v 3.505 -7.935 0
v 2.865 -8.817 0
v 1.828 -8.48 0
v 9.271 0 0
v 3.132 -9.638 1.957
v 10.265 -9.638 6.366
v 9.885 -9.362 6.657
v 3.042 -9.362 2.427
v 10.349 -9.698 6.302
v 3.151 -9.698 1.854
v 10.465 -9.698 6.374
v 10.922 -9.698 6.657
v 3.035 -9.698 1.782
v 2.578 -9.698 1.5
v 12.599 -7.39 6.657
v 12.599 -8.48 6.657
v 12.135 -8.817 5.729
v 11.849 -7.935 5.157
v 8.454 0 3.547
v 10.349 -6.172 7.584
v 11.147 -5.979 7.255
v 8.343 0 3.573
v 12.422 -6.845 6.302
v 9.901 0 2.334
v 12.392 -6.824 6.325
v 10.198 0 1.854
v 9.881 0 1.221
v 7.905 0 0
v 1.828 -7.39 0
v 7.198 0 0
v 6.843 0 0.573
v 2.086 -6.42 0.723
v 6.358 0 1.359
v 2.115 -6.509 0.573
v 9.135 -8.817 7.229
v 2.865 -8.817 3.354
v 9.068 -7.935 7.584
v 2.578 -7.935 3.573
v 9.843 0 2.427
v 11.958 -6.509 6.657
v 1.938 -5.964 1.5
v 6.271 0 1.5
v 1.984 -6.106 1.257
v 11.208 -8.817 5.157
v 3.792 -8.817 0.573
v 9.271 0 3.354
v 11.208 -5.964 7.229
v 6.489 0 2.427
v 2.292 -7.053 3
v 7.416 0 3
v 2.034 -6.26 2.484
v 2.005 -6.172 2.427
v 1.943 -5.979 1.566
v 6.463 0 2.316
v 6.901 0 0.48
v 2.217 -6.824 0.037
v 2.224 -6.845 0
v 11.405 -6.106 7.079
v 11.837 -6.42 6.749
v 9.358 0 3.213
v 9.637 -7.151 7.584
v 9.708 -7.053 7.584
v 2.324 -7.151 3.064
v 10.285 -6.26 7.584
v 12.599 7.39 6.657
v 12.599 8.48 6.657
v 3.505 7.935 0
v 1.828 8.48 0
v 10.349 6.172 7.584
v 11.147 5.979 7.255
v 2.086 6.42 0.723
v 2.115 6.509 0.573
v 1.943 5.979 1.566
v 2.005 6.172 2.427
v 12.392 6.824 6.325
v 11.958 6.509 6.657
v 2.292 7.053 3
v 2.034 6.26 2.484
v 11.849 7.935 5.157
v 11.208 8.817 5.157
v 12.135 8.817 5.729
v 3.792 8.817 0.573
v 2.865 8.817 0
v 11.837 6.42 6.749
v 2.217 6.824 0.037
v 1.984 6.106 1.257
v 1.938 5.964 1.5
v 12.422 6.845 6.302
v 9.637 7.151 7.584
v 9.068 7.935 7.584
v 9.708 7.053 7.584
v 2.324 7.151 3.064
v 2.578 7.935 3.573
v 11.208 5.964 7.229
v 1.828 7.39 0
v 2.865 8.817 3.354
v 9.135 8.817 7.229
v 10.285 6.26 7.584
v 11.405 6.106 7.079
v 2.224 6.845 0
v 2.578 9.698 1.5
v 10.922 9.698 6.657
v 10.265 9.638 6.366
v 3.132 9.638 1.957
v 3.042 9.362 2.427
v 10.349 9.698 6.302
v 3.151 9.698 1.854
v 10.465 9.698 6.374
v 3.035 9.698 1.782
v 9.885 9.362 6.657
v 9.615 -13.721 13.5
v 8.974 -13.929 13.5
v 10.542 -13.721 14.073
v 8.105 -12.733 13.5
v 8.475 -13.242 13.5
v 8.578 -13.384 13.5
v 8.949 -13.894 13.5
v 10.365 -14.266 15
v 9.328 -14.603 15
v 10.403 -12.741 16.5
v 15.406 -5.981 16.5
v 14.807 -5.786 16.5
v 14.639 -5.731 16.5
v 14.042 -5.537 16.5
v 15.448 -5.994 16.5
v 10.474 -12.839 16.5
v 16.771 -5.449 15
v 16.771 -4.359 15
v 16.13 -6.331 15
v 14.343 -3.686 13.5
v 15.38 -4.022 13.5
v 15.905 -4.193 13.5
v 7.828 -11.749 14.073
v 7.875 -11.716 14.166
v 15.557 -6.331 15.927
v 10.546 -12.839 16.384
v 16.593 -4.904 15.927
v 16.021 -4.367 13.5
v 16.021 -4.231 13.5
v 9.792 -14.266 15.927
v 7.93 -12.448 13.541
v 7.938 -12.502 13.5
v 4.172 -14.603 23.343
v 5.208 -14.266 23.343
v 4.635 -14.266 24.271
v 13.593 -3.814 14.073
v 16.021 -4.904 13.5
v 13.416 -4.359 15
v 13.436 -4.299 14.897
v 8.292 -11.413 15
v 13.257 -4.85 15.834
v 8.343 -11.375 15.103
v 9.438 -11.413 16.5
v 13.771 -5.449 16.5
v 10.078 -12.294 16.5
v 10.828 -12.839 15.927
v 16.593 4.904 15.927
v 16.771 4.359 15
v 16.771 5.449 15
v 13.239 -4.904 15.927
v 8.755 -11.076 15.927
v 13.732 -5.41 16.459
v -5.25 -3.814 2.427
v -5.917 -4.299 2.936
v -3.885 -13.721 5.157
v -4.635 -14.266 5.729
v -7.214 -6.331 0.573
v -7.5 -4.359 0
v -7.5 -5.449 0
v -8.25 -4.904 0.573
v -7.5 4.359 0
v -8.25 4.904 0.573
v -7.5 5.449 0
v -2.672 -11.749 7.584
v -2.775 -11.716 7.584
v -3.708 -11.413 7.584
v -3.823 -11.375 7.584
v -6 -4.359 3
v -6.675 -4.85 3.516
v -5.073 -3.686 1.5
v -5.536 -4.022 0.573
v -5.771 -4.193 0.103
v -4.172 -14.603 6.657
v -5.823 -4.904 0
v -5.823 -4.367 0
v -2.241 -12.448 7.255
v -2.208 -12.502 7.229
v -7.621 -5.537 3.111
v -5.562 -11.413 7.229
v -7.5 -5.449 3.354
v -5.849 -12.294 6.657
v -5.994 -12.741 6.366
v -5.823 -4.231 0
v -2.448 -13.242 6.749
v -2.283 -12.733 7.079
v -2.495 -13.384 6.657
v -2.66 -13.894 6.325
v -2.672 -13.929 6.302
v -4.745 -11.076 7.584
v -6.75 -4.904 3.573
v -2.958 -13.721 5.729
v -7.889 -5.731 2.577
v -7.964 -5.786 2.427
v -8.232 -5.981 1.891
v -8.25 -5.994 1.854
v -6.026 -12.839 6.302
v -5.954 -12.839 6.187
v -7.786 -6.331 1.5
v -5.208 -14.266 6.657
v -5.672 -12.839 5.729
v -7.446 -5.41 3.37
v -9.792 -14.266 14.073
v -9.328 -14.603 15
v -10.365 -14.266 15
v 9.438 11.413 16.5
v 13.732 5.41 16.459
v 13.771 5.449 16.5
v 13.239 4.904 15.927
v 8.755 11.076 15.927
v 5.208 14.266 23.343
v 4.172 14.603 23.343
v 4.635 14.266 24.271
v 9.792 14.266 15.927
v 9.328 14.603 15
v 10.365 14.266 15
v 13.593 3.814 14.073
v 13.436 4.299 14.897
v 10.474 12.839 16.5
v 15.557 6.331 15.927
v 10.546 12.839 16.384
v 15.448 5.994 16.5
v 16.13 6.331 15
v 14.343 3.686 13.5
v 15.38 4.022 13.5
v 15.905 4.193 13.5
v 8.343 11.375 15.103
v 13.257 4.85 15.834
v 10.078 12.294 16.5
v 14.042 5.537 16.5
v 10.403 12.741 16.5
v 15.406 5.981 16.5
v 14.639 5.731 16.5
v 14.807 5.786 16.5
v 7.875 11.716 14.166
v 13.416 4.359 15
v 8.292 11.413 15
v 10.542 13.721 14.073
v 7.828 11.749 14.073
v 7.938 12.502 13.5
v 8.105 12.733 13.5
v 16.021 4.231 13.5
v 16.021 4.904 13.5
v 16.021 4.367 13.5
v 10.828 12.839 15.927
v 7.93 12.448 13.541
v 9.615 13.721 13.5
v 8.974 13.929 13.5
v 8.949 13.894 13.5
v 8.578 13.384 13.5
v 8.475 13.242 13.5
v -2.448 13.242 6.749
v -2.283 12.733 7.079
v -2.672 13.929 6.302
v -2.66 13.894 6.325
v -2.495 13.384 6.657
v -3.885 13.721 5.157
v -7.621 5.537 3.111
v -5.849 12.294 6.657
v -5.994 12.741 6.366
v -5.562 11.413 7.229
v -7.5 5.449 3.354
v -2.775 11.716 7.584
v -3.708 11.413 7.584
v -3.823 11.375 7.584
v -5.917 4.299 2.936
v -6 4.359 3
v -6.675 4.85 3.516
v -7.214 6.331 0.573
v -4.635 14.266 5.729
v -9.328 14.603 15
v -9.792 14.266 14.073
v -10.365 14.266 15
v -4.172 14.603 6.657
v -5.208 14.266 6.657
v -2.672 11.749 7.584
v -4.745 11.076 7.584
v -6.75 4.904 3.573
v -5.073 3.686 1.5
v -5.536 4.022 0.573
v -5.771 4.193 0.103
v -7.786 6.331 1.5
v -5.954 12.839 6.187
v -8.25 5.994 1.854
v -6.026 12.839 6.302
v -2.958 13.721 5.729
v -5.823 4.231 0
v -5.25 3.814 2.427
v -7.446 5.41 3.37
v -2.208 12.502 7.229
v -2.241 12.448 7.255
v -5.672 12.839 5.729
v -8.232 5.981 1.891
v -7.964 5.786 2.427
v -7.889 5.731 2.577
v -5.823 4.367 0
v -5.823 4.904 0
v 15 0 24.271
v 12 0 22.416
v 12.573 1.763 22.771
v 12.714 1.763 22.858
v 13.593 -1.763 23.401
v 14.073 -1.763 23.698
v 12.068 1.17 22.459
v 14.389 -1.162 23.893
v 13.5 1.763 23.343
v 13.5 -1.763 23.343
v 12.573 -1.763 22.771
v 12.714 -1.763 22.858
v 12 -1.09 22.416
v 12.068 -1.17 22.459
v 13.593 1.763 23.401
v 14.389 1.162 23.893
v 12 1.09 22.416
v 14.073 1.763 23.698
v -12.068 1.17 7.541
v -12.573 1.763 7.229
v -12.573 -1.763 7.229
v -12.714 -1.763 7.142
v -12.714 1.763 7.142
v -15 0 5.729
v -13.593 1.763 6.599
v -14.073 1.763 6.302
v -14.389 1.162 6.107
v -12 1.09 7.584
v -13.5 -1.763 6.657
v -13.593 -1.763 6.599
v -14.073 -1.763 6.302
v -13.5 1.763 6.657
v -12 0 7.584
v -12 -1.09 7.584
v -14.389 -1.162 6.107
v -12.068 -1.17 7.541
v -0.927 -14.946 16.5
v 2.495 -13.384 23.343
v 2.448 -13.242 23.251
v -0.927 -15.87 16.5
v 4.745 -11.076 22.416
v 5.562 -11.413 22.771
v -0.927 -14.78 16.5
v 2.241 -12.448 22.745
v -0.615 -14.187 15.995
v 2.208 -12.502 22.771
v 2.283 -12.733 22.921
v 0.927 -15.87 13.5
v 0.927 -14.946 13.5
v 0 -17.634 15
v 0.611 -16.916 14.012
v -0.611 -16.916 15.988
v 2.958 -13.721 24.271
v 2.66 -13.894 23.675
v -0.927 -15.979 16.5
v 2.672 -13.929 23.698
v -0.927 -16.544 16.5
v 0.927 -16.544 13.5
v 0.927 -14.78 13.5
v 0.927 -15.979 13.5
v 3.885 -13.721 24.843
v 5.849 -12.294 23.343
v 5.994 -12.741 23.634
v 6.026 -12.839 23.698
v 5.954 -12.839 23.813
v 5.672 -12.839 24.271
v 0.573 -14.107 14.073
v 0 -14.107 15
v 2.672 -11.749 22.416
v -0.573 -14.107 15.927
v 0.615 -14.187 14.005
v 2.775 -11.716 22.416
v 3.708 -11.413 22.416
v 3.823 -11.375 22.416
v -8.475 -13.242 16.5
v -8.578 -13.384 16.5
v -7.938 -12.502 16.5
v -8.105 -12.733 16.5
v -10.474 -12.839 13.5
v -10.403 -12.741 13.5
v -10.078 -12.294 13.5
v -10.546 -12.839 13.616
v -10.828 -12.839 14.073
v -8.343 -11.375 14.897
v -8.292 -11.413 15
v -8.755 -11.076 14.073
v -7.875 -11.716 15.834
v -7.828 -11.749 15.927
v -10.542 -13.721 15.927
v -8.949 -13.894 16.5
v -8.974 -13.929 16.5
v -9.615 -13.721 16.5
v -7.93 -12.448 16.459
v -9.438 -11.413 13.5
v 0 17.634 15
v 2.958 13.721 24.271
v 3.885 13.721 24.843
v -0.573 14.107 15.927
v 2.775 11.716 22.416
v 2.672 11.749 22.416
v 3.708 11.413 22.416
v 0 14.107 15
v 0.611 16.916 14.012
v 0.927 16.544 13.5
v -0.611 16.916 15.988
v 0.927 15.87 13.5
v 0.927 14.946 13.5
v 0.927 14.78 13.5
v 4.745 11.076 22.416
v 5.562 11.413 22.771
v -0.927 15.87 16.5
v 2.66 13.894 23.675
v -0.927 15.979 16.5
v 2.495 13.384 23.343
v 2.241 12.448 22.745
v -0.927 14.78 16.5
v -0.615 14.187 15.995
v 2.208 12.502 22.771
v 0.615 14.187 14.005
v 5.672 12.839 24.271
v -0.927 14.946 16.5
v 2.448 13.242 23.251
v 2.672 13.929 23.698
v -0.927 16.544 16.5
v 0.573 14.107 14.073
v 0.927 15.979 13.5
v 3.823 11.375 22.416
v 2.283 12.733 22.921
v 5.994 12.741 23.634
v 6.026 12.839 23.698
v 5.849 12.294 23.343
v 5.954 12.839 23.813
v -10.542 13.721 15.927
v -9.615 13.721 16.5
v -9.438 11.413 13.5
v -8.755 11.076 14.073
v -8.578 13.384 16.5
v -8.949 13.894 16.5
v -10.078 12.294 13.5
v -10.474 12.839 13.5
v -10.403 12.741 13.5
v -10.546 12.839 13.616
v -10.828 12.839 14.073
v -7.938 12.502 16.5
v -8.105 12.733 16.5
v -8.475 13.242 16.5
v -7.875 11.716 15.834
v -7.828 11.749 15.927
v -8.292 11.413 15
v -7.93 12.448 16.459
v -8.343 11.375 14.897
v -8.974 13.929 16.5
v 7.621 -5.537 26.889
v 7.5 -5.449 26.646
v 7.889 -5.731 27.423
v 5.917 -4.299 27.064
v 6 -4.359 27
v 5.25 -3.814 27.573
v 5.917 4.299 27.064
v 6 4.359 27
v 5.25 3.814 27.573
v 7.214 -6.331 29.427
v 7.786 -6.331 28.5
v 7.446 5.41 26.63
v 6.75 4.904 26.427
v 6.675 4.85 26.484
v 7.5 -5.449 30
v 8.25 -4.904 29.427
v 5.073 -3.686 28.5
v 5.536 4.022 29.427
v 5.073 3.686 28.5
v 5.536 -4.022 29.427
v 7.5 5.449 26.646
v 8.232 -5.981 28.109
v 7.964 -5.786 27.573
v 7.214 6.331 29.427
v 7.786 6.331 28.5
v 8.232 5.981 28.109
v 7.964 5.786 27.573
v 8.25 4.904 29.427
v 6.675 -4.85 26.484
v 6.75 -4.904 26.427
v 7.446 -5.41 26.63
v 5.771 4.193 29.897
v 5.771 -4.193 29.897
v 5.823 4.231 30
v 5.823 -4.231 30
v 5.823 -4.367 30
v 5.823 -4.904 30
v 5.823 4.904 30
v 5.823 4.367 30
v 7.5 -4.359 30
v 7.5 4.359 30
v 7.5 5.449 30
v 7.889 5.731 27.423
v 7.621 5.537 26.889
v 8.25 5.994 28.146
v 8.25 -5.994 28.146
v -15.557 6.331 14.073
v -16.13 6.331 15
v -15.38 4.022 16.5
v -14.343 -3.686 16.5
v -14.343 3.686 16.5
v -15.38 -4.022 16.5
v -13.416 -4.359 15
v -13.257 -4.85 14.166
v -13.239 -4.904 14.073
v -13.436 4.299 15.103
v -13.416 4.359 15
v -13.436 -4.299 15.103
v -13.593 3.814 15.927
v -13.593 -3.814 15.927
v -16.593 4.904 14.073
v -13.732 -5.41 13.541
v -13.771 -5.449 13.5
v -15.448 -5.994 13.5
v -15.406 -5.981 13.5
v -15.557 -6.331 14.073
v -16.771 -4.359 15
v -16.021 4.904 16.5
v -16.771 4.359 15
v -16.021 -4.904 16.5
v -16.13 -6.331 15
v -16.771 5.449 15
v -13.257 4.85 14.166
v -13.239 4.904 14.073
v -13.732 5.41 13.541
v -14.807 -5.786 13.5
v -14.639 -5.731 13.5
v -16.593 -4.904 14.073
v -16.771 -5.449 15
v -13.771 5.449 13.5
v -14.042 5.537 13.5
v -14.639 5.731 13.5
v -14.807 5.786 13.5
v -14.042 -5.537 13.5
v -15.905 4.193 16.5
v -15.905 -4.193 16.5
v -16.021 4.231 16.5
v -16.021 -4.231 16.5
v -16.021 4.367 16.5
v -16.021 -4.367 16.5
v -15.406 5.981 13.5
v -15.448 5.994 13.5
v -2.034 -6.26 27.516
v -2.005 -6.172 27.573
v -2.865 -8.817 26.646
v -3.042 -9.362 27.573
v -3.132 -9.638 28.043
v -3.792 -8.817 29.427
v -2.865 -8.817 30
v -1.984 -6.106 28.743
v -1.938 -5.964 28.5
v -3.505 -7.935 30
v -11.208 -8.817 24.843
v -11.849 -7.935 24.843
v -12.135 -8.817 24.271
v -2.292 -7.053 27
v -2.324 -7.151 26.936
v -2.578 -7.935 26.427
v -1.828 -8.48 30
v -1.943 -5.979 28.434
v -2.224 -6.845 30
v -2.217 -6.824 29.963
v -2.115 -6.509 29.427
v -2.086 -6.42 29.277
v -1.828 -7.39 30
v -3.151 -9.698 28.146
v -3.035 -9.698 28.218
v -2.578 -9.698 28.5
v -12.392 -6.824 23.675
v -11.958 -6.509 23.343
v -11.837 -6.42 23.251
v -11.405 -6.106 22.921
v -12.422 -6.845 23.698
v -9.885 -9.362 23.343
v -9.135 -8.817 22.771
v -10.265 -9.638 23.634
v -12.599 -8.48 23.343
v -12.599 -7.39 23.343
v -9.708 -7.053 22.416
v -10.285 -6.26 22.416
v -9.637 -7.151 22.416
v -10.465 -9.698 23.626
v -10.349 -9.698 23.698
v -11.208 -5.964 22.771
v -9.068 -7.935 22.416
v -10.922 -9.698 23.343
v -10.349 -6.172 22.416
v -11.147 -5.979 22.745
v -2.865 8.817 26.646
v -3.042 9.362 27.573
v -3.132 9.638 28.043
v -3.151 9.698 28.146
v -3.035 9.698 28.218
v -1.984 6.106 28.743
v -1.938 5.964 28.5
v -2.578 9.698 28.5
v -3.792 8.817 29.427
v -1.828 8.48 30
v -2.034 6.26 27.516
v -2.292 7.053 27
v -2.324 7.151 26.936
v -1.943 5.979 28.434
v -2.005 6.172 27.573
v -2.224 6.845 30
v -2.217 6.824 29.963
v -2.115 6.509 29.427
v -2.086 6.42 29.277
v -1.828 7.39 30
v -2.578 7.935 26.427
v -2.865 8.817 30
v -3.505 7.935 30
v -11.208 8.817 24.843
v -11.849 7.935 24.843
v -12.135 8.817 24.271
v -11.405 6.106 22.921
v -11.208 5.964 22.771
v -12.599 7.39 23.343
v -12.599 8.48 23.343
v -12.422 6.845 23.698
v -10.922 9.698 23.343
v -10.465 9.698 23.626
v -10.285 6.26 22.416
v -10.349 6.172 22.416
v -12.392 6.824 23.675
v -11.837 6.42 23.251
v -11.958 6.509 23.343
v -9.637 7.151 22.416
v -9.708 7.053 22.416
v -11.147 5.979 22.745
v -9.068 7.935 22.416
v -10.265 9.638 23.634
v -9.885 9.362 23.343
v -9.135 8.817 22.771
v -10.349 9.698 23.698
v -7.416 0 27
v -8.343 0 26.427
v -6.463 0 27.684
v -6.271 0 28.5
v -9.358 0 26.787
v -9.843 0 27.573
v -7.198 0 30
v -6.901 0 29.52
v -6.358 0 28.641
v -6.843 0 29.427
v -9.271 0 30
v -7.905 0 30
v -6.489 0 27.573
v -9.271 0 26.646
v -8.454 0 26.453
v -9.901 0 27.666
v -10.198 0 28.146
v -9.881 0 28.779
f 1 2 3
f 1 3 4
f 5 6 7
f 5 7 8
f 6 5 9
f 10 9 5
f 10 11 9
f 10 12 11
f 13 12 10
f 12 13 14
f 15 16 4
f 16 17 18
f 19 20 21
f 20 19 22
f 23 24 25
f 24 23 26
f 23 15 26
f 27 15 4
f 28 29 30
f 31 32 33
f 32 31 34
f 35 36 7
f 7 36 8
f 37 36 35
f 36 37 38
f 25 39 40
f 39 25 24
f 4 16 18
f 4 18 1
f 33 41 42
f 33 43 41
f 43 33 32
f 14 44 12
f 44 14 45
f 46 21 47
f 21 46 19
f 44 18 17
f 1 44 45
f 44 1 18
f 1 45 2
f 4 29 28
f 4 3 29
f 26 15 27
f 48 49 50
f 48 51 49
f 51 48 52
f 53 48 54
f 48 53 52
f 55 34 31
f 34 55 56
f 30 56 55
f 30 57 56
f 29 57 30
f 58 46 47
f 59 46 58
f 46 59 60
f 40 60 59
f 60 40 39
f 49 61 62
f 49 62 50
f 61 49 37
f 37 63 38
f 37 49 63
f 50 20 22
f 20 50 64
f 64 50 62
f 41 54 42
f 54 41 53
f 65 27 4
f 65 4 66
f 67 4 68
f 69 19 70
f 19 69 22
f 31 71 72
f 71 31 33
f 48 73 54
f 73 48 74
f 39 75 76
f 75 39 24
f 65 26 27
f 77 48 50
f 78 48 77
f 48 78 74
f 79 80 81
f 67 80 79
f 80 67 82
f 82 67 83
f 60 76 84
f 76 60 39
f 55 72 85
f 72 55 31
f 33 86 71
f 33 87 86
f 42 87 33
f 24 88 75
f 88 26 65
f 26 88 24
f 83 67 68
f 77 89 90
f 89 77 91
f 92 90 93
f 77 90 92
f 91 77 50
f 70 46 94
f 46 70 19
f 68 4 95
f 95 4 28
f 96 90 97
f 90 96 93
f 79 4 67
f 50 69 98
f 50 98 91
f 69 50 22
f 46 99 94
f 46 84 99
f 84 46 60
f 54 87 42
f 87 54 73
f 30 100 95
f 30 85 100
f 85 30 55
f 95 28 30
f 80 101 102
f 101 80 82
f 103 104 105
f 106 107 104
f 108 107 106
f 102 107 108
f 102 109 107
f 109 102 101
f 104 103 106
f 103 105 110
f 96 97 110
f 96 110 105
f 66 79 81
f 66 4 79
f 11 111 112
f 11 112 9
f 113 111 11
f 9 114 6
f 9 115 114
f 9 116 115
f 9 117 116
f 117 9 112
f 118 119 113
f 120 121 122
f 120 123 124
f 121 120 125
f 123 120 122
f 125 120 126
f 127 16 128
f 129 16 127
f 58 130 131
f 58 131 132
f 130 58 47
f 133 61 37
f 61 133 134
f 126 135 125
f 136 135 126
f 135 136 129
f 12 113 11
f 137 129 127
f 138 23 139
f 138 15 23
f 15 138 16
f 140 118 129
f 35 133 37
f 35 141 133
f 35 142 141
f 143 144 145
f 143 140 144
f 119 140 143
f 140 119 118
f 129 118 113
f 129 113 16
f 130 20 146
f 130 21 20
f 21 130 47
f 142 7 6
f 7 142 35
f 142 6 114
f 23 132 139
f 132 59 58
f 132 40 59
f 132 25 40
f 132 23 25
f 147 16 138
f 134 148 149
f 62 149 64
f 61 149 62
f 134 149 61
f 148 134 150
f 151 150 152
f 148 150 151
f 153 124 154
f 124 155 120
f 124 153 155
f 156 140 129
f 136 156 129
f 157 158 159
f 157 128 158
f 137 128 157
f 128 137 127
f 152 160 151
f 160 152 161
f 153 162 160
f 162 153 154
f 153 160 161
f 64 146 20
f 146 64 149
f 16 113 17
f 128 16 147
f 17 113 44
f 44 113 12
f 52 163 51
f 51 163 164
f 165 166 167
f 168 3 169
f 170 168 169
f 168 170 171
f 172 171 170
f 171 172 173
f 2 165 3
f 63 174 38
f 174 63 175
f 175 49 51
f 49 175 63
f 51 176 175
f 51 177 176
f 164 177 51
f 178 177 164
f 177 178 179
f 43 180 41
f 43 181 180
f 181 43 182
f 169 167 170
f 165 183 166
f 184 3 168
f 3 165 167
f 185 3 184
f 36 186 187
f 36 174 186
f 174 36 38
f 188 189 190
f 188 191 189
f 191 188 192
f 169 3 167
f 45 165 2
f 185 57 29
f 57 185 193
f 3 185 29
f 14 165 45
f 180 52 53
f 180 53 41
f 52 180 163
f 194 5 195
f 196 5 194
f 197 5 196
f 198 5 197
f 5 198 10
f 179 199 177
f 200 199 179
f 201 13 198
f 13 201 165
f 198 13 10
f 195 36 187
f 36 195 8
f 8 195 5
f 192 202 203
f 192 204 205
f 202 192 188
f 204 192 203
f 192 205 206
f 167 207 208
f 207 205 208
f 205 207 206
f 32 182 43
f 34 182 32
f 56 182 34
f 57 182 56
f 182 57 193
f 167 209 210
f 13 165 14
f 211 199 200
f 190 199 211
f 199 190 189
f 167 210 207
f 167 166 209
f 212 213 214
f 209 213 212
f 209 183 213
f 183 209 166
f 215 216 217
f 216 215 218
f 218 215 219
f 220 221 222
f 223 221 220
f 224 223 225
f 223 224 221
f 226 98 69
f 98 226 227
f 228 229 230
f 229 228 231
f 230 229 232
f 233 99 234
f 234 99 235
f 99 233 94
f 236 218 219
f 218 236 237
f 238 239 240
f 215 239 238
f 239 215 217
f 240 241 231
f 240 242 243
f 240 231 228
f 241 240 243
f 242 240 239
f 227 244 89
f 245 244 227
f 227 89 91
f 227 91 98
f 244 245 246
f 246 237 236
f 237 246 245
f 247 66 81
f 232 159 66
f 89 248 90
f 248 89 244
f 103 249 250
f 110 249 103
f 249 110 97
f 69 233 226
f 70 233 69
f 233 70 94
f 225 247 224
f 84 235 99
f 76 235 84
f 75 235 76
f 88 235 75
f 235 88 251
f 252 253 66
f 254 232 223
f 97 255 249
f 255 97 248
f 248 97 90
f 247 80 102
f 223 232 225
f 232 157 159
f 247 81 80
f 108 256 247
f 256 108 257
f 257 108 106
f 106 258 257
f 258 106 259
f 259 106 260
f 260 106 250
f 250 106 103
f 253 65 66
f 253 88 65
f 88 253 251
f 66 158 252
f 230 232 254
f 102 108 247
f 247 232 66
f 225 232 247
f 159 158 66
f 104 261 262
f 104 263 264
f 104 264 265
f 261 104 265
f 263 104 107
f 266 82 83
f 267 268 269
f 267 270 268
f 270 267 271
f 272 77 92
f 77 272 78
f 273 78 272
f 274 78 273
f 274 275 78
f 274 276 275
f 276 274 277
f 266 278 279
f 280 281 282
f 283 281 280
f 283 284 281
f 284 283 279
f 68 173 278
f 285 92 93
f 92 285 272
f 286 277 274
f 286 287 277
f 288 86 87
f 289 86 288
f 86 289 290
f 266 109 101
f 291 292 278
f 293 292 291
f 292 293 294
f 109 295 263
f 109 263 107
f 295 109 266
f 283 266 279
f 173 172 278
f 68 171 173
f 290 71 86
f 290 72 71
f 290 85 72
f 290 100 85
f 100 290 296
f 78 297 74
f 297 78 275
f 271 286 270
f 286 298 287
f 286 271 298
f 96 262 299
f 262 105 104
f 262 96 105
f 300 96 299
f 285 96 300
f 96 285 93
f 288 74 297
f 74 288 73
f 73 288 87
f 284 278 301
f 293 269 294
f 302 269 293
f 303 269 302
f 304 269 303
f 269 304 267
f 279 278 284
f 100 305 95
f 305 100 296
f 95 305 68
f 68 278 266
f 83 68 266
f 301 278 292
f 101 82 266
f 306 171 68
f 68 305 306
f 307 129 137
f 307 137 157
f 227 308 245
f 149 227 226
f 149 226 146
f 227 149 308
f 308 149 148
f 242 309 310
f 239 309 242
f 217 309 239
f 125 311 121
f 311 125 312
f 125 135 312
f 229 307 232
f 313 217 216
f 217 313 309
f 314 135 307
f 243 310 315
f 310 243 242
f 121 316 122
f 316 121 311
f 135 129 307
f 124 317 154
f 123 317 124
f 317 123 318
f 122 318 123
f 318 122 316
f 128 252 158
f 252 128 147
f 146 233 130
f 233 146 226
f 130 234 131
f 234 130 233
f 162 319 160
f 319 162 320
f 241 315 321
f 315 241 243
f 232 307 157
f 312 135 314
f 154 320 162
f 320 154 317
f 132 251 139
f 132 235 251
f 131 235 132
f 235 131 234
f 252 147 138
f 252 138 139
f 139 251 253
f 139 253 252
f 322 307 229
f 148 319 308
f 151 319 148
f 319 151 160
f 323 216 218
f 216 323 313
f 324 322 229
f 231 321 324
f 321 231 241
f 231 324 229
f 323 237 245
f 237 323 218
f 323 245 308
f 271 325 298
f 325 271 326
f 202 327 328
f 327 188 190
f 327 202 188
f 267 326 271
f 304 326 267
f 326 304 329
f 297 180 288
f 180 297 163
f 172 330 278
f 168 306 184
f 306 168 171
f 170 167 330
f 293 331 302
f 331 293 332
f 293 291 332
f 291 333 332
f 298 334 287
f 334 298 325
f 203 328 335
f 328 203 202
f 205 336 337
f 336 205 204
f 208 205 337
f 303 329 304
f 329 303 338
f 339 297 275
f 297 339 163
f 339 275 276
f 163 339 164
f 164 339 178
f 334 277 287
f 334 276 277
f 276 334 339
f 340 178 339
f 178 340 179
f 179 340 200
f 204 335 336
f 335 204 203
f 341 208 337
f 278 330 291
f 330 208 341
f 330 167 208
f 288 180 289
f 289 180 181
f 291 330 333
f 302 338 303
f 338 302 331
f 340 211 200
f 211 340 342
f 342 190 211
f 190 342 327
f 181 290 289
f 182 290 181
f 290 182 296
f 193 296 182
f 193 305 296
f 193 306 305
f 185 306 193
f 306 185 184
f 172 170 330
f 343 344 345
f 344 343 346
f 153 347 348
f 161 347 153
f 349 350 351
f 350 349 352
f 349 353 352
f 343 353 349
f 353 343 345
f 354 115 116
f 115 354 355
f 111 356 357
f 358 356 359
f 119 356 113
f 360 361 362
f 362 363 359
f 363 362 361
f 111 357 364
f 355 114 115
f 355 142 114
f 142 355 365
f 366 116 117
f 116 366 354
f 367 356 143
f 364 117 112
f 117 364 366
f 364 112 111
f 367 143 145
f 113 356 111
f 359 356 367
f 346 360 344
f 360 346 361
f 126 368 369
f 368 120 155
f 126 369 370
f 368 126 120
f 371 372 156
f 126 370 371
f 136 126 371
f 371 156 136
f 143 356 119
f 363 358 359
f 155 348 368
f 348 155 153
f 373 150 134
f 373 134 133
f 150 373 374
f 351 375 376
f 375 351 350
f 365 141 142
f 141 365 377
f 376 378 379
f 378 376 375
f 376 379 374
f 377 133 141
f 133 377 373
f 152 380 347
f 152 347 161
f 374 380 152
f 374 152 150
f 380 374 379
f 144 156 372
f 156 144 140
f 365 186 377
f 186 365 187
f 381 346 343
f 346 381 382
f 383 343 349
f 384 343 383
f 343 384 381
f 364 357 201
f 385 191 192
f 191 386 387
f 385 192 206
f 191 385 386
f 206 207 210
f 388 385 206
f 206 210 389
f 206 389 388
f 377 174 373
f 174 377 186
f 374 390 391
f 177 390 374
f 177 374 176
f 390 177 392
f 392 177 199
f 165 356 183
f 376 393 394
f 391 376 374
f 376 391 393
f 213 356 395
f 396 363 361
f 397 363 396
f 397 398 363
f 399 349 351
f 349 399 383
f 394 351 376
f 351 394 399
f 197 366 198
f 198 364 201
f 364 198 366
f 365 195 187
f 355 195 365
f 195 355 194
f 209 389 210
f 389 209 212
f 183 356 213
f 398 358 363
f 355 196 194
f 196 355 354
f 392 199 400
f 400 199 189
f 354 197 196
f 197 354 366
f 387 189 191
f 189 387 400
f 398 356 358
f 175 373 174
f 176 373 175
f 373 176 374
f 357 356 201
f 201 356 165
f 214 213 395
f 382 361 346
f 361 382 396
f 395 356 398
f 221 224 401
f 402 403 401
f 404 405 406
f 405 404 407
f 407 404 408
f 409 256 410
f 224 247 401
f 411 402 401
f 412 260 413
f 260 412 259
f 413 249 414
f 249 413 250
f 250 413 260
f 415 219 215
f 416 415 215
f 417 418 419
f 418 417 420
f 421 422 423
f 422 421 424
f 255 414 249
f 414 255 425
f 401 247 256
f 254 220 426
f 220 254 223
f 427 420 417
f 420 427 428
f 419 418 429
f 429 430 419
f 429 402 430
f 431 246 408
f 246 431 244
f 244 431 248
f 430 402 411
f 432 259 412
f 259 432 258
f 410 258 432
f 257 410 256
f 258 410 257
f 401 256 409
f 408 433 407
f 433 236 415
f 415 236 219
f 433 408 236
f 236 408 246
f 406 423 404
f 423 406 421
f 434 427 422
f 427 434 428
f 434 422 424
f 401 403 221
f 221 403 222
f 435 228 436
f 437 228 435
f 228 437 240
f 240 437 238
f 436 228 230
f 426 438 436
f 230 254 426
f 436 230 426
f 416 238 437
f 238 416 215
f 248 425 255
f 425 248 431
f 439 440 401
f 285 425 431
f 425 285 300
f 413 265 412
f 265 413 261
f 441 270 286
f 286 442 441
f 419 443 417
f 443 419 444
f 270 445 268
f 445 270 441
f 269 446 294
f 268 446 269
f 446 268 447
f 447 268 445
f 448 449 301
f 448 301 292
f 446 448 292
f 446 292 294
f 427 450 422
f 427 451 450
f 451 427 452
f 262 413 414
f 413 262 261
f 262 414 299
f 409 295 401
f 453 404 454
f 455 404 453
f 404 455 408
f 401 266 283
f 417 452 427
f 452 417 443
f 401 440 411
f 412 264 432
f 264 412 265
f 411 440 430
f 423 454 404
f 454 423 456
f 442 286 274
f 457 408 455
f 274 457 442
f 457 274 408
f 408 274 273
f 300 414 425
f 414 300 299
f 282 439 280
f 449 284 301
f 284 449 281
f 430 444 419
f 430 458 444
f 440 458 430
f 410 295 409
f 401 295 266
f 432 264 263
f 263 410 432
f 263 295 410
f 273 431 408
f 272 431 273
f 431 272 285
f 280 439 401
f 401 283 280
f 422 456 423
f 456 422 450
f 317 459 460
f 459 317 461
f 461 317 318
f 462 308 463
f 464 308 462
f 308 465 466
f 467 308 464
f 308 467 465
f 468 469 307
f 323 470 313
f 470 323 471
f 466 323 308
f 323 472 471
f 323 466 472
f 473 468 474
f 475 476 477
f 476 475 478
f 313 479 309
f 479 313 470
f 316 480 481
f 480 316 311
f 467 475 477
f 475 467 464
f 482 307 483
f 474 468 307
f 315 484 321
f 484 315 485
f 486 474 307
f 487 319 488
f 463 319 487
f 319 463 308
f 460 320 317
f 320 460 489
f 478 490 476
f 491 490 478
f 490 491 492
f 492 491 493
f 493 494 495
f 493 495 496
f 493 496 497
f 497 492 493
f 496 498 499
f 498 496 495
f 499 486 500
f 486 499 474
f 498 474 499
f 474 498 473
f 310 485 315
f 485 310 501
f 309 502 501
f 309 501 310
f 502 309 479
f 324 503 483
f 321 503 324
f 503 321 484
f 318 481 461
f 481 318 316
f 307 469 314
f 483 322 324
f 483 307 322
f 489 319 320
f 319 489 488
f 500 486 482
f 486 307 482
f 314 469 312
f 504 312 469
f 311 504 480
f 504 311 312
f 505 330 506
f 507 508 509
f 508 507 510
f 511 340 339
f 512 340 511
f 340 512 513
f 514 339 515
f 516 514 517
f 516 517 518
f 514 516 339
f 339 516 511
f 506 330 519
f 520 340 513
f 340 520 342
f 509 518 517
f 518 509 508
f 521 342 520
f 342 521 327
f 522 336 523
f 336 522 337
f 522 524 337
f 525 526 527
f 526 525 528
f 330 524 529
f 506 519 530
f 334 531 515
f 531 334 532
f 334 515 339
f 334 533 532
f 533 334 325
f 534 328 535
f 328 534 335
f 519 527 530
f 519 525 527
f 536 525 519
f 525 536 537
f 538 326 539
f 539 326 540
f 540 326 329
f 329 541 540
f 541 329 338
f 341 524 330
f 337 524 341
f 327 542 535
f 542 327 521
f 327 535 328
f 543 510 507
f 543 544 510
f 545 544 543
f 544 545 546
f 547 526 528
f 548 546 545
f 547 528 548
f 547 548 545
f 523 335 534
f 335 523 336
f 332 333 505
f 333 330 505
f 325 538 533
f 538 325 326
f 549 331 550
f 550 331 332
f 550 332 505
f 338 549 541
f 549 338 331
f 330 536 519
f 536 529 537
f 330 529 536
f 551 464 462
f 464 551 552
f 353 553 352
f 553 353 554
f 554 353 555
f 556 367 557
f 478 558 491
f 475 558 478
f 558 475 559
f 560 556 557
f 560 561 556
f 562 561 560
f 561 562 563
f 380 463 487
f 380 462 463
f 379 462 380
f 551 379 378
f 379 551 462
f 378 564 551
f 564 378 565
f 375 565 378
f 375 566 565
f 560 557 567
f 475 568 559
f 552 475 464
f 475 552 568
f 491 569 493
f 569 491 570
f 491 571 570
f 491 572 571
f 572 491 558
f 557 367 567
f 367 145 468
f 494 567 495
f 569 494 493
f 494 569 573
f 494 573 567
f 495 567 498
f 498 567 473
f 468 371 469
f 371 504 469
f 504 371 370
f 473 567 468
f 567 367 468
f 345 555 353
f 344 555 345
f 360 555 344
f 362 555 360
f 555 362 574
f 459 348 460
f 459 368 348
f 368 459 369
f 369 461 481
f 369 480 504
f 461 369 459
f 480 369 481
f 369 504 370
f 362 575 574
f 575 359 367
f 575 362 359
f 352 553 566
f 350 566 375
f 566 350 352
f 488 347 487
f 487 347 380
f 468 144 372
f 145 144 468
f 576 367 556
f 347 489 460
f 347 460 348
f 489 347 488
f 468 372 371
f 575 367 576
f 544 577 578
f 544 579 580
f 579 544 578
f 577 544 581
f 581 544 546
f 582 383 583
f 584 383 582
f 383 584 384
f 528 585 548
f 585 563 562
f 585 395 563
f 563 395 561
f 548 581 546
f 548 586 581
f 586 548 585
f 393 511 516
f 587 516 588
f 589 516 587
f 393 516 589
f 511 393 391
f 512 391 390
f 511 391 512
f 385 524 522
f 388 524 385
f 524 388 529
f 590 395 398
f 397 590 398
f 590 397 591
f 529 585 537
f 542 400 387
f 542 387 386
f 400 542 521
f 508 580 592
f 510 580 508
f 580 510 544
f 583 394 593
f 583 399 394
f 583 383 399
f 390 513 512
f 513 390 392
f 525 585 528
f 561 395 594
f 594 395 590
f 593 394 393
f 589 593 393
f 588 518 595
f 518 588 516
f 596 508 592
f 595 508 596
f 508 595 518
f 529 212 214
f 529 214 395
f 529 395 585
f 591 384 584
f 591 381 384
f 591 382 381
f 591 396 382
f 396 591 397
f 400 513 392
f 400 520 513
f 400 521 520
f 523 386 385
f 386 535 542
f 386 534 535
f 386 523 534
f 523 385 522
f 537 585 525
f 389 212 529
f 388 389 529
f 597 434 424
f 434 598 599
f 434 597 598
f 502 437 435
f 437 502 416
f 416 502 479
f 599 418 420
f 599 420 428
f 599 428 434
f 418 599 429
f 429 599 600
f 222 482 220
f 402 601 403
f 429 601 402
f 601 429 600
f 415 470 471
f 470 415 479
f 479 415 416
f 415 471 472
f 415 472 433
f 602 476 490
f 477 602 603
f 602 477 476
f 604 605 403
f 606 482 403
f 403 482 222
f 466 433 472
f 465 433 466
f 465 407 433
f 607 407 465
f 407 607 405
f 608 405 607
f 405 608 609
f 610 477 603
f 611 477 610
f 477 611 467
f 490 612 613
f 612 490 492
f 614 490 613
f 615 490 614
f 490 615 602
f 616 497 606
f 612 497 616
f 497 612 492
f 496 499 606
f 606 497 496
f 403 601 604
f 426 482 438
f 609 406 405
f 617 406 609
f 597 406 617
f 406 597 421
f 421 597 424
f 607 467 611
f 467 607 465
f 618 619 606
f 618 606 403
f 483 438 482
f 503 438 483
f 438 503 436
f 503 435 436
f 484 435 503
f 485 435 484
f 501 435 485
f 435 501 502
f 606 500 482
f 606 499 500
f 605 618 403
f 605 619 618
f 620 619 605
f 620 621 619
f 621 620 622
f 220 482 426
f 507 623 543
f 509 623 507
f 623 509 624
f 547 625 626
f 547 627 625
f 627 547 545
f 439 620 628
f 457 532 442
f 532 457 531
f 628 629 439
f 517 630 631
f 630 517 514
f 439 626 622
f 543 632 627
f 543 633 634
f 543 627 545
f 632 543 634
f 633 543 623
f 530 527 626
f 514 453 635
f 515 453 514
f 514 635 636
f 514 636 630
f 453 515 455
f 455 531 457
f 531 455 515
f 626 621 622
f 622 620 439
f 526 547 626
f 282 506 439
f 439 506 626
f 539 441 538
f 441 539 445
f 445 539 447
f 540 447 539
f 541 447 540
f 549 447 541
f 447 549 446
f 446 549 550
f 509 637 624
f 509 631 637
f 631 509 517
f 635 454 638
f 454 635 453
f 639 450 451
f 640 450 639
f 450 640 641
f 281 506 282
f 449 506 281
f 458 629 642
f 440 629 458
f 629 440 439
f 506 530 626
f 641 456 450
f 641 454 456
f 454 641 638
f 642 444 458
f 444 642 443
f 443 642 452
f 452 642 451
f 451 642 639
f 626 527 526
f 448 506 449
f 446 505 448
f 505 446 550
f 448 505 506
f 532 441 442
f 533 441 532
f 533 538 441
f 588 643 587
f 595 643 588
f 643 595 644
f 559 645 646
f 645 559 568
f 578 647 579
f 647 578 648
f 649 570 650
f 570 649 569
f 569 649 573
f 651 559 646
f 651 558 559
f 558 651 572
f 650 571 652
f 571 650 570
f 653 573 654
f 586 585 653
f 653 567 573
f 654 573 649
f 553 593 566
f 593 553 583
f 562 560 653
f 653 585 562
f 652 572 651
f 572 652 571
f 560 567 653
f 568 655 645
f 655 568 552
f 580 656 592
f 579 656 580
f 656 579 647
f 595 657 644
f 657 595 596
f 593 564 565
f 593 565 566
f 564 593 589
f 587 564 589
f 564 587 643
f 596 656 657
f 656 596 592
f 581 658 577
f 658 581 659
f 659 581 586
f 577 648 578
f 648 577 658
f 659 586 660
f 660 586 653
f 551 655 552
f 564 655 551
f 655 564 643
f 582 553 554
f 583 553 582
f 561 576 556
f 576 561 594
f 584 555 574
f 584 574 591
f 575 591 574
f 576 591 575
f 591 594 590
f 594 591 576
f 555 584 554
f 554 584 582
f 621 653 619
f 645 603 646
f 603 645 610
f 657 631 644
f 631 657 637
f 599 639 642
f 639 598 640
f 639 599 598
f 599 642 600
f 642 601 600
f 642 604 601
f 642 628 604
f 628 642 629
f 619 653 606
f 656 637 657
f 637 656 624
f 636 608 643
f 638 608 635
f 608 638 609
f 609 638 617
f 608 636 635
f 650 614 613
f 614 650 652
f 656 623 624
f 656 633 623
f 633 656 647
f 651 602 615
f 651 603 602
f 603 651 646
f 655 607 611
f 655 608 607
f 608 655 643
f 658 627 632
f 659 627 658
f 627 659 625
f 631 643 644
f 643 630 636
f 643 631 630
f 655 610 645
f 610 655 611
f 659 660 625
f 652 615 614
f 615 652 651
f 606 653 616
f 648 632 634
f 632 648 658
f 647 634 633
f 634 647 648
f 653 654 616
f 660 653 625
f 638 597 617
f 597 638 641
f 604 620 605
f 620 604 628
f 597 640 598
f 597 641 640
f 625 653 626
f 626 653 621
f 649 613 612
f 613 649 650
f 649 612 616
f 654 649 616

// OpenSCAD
// shape height
sh = 30;
// border width
bw = 3;

include <polyhedra.scad>;

poly_wire(icosidodecahedron, fill_reg=[3]);
